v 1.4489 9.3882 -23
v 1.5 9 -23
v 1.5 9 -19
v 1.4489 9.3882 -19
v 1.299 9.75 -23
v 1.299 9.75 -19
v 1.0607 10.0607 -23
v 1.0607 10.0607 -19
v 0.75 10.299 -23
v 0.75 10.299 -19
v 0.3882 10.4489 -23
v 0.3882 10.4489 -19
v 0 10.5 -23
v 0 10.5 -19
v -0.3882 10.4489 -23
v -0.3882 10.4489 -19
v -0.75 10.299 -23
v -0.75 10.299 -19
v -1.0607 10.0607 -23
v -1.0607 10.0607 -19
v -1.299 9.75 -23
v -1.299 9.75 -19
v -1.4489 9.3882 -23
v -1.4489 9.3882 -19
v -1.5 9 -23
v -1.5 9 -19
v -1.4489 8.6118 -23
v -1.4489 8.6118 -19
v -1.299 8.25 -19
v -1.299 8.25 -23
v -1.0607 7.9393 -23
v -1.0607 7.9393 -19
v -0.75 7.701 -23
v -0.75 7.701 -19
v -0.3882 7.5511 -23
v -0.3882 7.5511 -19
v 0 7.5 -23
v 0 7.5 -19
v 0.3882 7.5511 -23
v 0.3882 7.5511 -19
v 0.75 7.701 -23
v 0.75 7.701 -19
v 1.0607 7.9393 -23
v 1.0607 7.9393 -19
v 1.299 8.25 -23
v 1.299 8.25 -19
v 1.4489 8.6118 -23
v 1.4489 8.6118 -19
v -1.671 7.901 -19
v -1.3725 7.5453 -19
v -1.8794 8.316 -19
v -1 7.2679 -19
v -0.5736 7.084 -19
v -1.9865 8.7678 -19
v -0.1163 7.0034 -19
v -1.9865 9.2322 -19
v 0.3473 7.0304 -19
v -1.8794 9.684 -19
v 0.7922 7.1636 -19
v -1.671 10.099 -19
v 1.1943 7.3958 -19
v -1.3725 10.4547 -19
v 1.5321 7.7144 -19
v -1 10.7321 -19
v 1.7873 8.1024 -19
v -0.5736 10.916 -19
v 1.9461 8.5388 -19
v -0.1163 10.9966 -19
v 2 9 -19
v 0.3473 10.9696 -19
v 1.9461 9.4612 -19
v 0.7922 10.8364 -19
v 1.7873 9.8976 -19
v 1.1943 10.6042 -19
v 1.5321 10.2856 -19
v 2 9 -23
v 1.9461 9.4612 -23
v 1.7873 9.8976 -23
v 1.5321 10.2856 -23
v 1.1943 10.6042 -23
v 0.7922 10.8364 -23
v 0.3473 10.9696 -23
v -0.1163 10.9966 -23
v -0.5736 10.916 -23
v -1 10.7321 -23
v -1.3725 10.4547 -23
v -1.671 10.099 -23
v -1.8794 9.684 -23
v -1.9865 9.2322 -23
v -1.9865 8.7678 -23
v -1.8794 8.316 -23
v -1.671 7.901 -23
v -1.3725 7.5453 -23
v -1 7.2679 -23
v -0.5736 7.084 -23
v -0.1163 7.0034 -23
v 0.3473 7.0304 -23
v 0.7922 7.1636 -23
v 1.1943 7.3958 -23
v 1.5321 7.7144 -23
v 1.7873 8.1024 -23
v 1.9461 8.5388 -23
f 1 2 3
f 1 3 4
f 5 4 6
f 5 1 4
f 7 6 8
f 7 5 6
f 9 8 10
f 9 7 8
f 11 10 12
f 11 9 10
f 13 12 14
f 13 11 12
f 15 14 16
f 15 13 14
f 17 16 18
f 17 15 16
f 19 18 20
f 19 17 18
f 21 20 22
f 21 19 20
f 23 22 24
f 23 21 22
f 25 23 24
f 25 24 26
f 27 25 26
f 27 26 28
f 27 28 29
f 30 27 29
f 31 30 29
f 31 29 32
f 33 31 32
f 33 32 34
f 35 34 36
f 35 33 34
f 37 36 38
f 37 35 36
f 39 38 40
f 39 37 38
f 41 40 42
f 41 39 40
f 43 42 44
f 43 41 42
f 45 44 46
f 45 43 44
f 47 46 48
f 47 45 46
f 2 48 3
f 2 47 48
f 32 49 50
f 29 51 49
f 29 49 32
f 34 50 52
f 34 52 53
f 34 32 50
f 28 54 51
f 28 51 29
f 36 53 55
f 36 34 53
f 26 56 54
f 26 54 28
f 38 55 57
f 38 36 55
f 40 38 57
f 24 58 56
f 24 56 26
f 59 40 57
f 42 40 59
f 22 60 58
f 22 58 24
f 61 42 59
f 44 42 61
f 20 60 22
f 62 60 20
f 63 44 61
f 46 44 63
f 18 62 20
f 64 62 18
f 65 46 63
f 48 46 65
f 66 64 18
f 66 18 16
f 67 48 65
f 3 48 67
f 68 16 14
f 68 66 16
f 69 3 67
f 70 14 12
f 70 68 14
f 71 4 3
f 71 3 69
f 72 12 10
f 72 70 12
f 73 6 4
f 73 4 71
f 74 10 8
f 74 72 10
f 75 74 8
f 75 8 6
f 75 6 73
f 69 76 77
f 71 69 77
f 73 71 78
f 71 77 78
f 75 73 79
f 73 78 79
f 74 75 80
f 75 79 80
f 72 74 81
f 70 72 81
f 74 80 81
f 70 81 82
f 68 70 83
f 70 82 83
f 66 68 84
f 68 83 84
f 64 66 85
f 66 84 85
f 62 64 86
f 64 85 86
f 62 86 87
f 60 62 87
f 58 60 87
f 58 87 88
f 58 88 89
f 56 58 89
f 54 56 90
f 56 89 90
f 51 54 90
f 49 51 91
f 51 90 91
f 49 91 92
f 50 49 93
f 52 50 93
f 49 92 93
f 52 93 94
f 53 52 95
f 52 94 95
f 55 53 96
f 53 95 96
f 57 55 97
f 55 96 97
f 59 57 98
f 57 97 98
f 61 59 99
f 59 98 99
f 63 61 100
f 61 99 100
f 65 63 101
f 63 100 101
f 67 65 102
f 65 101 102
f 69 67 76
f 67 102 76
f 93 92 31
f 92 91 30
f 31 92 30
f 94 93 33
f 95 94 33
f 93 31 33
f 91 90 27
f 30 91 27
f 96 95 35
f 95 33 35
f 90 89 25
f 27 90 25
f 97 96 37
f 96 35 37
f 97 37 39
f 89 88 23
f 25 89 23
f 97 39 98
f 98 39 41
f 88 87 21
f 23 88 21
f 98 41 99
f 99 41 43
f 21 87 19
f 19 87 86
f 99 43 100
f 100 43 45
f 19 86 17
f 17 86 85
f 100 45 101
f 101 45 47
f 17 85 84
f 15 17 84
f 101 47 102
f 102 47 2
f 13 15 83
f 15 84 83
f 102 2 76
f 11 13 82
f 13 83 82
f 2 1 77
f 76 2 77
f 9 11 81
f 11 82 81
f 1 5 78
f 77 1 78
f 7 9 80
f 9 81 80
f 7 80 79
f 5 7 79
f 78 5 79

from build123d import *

# Parameters (mm, degrees)
CYLINDER005_R     = 1.5
CYLINDER005_DEPTH = 4
CYLINDER004_R     = 2
CYLINDER004_DEPTH = 4


with BuildPart() as cylinderouter002:
    # Cylinder005 → Cylinder005 (new body)
    with BuildSketch(Plane(origin=(8, -26, -23), x_dir=(1, 0, 0), z_dir=(0, 0, 1))):
        Circle(CYLINDER005_R)
    extrude(amount=CYLINDER005_DEPTH)


with BuildPart() as relaysupp01:
    # Cylinder004 → Cylinder004 (new body)
    with BuildSketch(Plane(origin=(8, -26, -23), x_dir=(1, 0, 0), z_dir=(0, 0, 1))):
        Circle(CYLINDER004_R)
    extrude(amount=CYLINDER004_DEPTH)

    # Cut003: cut CylinderOuter002
    add(cylinderouter002.part, mode=Mode.SUBTRACT)


with BuildPart() as relaysupp01_1:
    # Cut003 placement: moved
    add(relaysupp01.part.moved(Location((-8, 35, 0))))


solid = relaysupp01_1.part
